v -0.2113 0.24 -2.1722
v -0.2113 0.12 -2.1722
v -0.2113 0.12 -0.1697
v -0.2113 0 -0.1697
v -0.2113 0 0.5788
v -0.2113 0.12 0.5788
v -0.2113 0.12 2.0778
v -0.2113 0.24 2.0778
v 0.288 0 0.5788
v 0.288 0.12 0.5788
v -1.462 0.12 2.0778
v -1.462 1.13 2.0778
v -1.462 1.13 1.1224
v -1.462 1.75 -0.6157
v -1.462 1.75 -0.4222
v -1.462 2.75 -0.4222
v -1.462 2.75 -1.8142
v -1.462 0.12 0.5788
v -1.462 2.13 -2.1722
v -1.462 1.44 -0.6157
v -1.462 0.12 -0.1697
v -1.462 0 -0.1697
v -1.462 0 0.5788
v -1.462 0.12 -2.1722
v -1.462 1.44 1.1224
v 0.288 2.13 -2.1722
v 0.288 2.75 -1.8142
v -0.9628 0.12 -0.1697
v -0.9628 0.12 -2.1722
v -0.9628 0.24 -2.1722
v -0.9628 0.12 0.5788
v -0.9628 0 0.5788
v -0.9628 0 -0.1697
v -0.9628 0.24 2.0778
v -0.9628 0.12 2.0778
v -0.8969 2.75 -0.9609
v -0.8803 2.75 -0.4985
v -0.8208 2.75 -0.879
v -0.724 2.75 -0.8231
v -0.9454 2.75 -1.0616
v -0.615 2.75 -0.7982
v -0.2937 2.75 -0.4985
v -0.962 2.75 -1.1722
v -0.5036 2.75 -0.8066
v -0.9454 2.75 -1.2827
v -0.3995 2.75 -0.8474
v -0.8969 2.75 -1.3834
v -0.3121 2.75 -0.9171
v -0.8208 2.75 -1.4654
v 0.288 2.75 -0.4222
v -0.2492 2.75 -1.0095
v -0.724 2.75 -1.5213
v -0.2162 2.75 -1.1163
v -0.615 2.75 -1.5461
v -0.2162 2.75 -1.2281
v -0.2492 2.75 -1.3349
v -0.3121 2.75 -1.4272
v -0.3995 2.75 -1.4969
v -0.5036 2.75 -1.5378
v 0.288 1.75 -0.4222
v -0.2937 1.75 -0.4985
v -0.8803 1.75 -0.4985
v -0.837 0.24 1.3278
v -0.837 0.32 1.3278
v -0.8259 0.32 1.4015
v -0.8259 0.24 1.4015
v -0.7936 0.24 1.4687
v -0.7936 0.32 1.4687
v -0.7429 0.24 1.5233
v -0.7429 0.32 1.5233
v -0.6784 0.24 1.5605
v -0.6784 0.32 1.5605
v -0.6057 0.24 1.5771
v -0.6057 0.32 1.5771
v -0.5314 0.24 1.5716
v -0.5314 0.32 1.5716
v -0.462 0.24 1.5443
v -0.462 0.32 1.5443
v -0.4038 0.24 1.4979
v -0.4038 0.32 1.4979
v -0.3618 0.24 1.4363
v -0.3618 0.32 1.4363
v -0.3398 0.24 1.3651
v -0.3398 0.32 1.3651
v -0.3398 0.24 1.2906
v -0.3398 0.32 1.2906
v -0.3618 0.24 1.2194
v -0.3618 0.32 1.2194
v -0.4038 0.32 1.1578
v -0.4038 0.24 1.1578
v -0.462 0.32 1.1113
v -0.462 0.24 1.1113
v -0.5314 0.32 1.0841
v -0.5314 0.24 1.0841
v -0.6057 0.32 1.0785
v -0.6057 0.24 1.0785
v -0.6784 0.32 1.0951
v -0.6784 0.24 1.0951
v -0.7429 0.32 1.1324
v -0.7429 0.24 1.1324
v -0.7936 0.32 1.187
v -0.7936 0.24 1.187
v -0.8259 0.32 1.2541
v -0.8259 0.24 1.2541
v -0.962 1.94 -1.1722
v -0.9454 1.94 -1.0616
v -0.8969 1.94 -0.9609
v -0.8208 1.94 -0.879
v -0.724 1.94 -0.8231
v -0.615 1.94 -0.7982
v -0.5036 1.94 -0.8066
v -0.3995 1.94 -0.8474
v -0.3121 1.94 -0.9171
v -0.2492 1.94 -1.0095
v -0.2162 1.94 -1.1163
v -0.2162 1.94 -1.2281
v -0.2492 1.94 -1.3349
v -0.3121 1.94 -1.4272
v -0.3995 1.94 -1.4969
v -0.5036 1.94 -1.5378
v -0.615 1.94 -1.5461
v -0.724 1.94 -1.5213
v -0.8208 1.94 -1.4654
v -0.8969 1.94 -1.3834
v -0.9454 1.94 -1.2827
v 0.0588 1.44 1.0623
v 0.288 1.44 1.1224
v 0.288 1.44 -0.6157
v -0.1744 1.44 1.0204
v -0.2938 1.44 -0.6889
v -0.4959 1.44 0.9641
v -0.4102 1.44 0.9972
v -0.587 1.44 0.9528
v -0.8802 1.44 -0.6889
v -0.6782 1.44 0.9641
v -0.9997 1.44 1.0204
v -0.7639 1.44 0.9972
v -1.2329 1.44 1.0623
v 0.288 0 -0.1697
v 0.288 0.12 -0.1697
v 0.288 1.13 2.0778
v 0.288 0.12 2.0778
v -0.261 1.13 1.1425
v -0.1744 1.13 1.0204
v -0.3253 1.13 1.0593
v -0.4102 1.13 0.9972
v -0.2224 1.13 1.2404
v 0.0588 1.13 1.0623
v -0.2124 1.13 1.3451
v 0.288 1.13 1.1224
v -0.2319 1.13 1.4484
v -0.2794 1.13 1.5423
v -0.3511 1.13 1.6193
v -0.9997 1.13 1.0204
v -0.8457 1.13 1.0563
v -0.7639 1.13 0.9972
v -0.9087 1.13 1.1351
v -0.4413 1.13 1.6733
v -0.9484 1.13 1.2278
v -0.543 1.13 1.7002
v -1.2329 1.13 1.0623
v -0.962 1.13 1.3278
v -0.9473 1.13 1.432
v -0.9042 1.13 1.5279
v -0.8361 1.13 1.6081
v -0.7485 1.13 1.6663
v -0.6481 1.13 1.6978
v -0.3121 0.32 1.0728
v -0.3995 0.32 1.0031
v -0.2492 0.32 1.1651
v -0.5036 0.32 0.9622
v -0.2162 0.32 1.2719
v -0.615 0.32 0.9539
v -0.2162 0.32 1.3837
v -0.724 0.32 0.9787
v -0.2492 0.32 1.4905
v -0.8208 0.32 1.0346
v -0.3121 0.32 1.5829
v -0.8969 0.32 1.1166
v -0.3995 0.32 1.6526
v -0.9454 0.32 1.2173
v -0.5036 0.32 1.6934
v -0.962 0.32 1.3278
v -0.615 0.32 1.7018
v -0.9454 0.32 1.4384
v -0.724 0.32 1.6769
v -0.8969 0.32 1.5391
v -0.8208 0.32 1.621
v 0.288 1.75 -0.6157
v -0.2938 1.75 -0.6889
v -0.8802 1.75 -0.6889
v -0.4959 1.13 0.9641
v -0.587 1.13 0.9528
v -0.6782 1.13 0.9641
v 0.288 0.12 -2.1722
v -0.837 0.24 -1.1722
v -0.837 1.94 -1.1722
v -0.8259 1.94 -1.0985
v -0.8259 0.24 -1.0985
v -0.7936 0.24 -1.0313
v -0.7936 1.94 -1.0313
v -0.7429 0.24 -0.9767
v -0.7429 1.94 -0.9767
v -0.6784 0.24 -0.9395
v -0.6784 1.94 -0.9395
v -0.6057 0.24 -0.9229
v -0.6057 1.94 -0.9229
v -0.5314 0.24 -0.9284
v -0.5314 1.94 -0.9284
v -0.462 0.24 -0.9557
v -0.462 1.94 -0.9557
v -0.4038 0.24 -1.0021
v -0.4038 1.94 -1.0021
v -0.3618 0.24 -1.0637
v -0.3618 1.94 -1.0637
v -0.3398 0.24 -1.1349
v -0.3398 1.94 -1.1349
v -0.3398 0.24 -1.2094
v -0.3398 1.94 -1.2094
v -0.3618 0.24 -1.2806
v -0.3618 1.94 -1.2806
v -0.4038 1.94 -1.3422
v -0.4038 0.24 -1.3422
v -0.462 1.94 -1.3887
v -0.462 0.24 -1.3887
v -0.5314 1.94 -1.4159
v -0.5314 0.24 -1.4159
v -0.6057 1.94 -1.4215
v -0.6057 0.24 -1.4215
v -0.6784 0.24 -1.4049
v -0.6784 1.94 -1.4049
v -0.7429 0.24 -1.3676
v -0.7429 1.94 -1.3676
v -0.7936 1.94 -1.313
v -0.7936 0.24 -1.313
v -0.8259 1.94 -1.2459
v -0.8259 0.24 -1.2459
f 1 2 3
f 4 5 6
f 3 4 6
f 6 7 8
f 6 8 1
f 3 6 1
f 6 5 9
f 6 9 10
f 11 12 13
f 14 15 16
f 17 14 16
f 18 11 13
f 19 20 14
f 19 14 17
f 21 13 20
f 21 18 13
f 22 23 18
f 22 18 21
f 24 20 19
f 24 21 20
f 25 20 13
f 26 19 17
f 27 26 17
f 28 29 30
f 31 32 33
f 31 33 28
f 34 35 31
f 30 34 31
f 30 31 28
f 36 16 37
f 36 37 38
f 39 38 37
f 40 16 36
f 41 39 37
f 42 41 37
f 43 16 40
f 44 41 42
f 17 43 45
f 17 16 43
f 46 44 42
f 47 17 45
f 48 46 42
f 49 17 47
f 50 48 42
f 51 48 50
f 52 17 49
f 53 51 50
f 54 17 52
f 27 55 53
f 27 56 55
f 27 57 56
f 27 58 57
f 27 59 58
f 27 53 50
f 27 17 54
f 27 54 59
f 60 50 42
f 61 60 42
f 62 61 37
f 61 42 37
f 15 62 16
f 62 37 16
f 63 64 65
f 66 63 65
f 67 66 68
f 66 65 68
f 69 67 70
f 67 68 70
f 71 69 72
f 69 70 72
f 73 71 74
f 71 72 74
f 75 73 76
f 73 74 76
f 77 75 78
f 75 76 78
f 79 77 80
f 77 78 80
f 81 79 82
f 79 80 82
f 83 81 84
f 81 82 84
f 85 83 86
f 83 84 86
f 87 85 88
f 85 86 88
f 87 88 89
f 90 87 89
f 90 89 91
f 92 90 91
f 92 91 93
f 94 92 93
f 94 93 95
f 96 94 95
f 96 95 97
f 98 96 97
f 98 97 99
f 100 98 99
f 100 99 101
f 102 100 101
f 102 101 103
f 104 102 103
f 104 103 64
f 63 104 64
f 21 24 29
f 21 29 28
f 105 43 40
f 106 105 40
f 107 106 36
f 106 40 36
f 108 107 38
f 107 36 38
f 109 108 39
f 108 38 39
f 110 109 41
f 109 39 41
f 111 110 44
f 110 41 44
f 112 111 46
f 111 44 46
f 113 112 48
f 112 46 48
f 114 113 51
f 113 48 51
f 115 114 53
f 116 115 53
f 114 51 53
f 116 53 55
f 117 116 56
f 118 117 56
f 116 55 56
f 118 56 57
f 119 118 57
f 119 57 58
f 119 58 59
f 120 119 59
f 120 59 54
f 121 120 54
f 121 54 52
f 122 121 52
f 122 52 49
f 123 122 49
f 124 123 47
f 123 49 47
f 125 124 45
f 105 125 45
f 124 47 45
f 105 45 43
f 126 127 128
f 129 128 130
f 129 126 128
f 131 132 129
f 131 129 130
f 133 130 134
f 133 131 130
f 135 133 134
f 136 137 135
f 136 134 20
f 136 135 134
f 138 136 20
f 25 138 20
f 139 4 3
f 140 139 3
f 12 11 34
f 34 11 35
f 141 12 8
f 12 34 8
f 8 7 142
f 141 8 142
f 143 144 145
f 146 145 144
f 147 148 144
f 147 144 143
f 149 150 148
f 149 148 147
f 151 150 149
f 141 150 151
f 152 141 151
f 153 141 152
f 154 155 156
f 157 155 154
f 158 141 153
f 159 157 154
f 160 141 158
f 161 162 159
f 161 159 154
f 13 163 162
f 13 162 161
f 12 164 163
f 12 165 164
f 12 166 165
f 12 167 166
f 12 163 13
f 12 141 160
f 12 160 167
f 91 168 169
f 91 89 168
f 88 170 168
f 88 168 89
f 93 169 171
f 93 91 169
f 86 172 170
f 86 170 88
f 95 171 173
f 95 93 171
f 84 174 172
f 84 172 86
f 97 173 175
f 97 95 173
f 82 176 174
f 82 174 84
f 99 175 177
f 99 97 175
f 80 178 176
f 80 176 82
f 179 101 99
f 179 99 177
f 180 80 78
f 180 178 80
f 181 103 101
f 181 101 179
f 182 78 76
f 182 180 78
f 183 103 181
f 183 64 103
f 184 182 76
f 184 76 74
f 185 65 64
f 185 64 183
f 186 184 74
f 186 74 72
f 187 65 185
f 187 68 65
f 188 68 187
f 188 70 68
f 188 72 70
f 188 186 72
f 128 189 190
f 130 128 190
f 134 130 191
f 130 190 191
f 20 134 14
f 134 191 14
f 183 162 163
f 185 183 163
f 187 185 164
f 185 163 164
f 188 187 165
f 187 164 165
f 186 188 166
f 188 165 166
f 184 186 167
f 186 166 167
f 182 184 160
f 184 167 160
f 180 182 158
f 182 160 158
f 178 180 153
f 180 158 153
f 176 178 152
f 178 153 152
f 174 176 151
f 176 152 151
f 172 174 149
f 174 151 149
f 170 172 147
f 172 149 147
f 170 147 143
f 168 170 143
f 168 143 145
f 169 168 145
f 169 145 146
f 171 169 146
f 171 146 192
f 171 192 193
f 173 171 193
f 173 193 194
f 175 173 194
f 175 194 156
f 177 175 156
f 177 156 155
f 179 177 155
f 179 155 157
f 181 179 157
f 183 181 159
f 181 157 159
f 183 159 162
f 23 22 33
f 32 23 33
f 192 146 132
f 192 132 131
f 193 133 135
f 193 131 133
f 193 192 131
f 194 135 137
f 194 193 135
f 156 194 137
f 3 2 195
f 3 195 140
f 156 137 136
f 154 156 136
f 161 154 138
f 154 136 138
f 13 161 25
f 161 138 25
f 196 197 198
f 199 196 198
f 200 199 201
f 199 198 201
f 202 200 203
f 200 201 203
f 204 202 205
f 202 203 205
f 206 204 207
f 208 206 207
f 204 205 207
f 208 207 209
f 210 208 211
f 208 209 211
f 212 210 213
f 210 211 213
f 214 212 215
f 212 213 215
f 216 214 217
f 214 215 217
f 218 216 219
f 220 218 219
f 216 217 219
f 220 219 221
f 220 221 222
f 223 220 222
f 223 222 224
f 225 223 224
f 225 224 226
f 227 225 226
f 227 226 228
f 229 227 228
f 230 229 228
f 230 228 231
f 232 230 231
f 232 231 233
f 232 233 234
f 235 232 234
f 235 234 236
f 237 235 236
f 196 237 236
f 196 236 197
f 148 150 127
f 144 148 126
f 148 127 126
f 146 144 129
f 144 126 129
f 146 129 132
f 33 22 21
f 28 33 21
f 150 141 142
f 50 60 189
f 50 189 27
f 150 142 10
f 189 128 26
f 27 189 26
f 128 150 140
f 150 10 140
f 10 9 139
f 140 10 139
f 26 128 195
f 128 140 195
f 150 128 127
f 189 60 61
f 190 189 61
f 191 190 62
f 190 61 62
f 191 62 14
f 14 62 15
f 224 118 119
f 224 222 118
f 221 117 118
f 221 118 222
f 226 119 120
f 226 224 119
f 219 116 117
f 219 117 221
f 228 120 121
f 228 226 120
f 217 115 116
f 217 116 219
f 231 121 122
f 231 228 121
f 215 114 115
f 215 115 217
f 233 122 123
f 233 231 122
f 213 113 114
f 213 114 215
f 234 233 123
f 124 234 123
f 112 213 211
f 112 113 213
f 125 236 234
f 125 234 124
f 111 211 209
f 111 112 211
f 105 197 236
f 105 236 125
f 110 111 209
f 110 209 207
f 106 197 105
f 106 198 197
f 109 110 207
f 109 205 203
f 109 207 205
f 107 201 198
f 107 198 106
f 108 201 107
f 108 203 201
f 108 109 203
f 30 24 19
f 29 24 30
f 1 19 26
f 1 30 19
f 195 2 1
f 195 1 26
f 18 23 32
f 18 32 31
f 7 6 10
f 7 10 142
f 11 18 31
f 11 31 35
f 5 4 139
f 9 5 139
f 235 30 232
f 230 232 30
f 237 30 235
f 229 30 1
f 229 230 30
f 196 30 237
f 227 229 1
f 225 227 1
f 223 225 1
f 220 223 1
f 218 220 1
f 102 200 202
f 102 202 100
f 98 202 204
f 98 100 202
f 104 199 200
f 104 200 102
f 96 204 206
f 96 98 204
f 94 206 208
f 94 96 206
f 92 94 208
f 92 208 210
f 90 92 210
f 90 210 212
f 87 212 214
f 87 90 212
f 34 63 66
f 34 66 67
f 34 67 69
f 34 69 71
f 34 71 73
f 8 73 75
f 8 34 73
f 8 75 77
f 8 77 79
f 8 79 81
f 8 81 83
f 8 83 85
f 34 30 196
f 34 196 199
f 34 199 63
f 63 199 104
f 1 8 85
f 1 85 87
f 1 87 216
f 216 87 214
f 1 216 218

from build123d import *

# Parameters (mm, degrees)
SKETCH1_W                = 1.75
SKETCH1_H                = 4.25
EXTRUDE1_DEPTH           = 2.75
SKETCH3_W                = 2.0025
SKETCH3_H                = 0.12
CUT_EXTRUDE1_DEPTH       = 2.75
SKETCH4_W                = 1.499
SKETCH4_H                = 0.12
CUT_EXTRUDE2_DEPTH       = 2.75
SKETCH5_W                = 0.7515
SKETCH5_H                = 0.24
CUT_EXTRUDE3_DEPTH       = 5.25
CUT_EXTRUDE4_DEPTH       = 1.31
CUT_EXTRUDE7_START       = -1
CUT_EXTRUDE7_DEPTH       = 0.31
CUT_EXTRUDE8_DEPTH       = 0.31
SKETCH11_R               = 0.375
CUT_EXTRUDE10_DEPTH      = 2.62
CUT_EXTRUDE10_DEPTH_BACK = 0.81
SKETCH13_R               = 0.25
CUT_EXTRUDE11_DEPTH      = 0.81
SKETCH14_R               = 0.375
SKETCH14_R_2             = 0.25
CUT_EXTRUDE12_DEPTH      = 0.81
SKETCH15_R               = 0.25
CUT_EXTRUDE13_DEPTH      = 2.94
CUT_EXTRUDE14_DEPTH      = 2.75


with BuildPart() as part:
    # Sketch1 → Extrude1 (new body)
    with BuildSketch(Plane(origin=(0, 0, 0), x_dir=(1, 0, 0), z_dir=(0, 1, 0))):
        with Locations((-0.587019269, 0.04717902)):
            Rectangle(SKETCH1_W, SKETCH1_H)
    extrude(amount=EXTRUDE1_DEPTH)

    # Sketch3 → Cut-Extrude1 (cut)
    with BuildSketch(Plane.ZY.offset(1.462019269)):
        with Locations((-1.17092902, 0.06)):
            Rectangle(SKETCH3_W, SKETCH3_H)
    extrude(amount=-CUT_EXTRUDE1_DEPTH, mode=Mode.SUBTRACT)

    # Sketch4 → Cut-Extrude2 (cut)
    with BuildSketch(Plane.ZY.offset(1.462019269)):
        with Locations((1.32832098, 0.06)):
            Rectangle(SKETCH4_W, SKETCH4_H)
    extrude(amount=-CUT_EXTRUDE2_DEPTH, mode=Mode.SUBTRACT)

    # Sketch5 → Cut-Extrude3 (cut, through all)
    with BuildSketch(Plane.XY.offset(2.07782098)):
        with Locations((-0.587019269, 0.12)):
            Rectangle(SKETCH5_W, SKETCH5_H)
    extrude(amount=-CUT_EXTRUDE3_DEPTH, mode=Mode.SUBTRACT)

    # Sketch6 → Cut-Extrude4 (cut)
    with BuildSketch(Plane(origin=(0, 2.75, 0), x_dir=(-1, 0, 0), z_dir=(0, 1, 0))):
        with BuildLine():
            ThreePointArc((-0.287980731, -0.42217902), (0.587019269, -0.508068124), (1.462019269, -0.42217902))
            Line((1.462019269, -0.42217902), (1.462019269, 2.07782098))
            Line((1.462019269, 2.07782098), (-0.287980731, 2.07782098))
            Line((-0.287980731, 2.07782098), (-0.287980731, -0.42217902))
        make_face()
    extrude(amount=-CUT_EXTRUDE4_DEPTH, mode=Mode.SUBTRACT)

    # Sketch7 → Cut-Extrude7 (cut)
    with BuildSketch(Plane(origin=(0, 2.75, 0), x_dir=(-1, 0, 0), z_dir=(0, 1, 0)).offset(CUT_EXTRUDE7_START)):
        with BuildLine():
            Line((1.462019269, -0.615722082), (1.462019269, -0.42217902))
            ThreePointArc((1.462019269, -0.42217902), (0.587019269, -0.508068124), (-0.287980731, -0.42217902))
            Line((-0.287980731, -0.42217902), (-0.287980731, -0.615722082))
            ThreePointArc((-0.287980731, -0.615722082), (0.587019269, -0.698068124), (1.462019269, -0.615722082))
        make_face()
    extrude(amount=-CUT_EXTRUDE7_DEPTH, mode=Mode.SUBTRACT)

    # Sketch8 → Cut-Extrude8 (cut)
    with BuildSketch(Plane(origin=(0, 1.44, 0), x_dir=(-1, 0, 0), z_dir=(0, 1, 0))):
        with BuildLine():
            ThreePointArc((-0.287980731, 1.122371805), (0.587019269, 0.991931876), (1.462019269, 1.122371805))
            Line((1.462019269, 1.122371805), (1.462019269, 2.07782098))
            Line((1.462019269, 2.07782098), (-0.287980731, 2.07782098))
            Line((-0.287980731, 2.07782098), (-0.287980731, 1.122371805))
        make_face()
    extrude(amount=-CUT_EXTRUDE8_DEPTH, mode=Mode.SUBTRACT)

    # Sketch11 → Cut-Extrude10 (cut, two sides)
    with BuildSketch(Plane(origin=(0, 1.13, 0), x_dir=(-1, 0, 0), z_dir=(0, 1, 0))) as cut_extrude10_sk:
        with Locations((0.587019269, 1.32782098)):
            Circle(SKETCH11_R)
    extrude(amount=CUT_EXTRUDE10_DEPTH, mode=Mode.SUBTRACT)
    extrude(cut_extrude10_sk.sketch, amount=-CUT_EXTRUDE10_DEPTH_BACK, mode=Mode.SUBTRACT)

    # Sketch13 → Cut-Extrude11 (cut)
    with BuildSketch(Plane(origin=(0, 0.32, 0), x_dir=(-1, 0, 0), z_dir=(0, 1, 0))):
        with Locations((0.587019269, 1.32782098)):
            Circle(SKETCH13_R)
    extrude(amount=-CUT_EXTRUDE11_DEPTH, mode=Mode.SUBTRACT)

    # Sketch14 → Cut-Extrude12 (cut)
    with BuildSketch(Plane(origin=(0, 2.75, 0), x_dir=(-1, 0, 0), z_dir=(0, 1, 0))):
        with Locations((0.587019269, -1.17217902)):
            Circle(SKETCH14_R)
        with Locations((0.587019269, 1.32782098)):
            Circle(SKETCH14_R_2)
    extrude(amount=-CUT_EXTRUDE12_DEPTH, mode=Mode.SUBTRACT)

    # Sketch15 → Cut-Extrude13 (cut, through all)
    with BuildSketch(Plane(origin=(0, 1.94, 0), x_dir=(-1, 0, 0), z_dir=(0, 1, 0))):
        with Locations((0.587019269, -1.17217902)):
            Circle(SKETCH15_R)
    extrude(amount=-CUT_EXTRUDE13_DEPTH, mode=Mode.SUBTRACT)

    # Sketch16 → Cut-Extrude14 (cut, through all)
    with BuildSketch(Plane.ZY.offset(1.462019269)):
        Polygon((-2.17217902, 2.75), (-2.17217902, 2.13), (-1.814221853, 2.75), align=None)
    extrude(amount=-CUT_EXTRUDE14_DEPTH, mode=Mode.SUBTRACT)


solid = part.part
